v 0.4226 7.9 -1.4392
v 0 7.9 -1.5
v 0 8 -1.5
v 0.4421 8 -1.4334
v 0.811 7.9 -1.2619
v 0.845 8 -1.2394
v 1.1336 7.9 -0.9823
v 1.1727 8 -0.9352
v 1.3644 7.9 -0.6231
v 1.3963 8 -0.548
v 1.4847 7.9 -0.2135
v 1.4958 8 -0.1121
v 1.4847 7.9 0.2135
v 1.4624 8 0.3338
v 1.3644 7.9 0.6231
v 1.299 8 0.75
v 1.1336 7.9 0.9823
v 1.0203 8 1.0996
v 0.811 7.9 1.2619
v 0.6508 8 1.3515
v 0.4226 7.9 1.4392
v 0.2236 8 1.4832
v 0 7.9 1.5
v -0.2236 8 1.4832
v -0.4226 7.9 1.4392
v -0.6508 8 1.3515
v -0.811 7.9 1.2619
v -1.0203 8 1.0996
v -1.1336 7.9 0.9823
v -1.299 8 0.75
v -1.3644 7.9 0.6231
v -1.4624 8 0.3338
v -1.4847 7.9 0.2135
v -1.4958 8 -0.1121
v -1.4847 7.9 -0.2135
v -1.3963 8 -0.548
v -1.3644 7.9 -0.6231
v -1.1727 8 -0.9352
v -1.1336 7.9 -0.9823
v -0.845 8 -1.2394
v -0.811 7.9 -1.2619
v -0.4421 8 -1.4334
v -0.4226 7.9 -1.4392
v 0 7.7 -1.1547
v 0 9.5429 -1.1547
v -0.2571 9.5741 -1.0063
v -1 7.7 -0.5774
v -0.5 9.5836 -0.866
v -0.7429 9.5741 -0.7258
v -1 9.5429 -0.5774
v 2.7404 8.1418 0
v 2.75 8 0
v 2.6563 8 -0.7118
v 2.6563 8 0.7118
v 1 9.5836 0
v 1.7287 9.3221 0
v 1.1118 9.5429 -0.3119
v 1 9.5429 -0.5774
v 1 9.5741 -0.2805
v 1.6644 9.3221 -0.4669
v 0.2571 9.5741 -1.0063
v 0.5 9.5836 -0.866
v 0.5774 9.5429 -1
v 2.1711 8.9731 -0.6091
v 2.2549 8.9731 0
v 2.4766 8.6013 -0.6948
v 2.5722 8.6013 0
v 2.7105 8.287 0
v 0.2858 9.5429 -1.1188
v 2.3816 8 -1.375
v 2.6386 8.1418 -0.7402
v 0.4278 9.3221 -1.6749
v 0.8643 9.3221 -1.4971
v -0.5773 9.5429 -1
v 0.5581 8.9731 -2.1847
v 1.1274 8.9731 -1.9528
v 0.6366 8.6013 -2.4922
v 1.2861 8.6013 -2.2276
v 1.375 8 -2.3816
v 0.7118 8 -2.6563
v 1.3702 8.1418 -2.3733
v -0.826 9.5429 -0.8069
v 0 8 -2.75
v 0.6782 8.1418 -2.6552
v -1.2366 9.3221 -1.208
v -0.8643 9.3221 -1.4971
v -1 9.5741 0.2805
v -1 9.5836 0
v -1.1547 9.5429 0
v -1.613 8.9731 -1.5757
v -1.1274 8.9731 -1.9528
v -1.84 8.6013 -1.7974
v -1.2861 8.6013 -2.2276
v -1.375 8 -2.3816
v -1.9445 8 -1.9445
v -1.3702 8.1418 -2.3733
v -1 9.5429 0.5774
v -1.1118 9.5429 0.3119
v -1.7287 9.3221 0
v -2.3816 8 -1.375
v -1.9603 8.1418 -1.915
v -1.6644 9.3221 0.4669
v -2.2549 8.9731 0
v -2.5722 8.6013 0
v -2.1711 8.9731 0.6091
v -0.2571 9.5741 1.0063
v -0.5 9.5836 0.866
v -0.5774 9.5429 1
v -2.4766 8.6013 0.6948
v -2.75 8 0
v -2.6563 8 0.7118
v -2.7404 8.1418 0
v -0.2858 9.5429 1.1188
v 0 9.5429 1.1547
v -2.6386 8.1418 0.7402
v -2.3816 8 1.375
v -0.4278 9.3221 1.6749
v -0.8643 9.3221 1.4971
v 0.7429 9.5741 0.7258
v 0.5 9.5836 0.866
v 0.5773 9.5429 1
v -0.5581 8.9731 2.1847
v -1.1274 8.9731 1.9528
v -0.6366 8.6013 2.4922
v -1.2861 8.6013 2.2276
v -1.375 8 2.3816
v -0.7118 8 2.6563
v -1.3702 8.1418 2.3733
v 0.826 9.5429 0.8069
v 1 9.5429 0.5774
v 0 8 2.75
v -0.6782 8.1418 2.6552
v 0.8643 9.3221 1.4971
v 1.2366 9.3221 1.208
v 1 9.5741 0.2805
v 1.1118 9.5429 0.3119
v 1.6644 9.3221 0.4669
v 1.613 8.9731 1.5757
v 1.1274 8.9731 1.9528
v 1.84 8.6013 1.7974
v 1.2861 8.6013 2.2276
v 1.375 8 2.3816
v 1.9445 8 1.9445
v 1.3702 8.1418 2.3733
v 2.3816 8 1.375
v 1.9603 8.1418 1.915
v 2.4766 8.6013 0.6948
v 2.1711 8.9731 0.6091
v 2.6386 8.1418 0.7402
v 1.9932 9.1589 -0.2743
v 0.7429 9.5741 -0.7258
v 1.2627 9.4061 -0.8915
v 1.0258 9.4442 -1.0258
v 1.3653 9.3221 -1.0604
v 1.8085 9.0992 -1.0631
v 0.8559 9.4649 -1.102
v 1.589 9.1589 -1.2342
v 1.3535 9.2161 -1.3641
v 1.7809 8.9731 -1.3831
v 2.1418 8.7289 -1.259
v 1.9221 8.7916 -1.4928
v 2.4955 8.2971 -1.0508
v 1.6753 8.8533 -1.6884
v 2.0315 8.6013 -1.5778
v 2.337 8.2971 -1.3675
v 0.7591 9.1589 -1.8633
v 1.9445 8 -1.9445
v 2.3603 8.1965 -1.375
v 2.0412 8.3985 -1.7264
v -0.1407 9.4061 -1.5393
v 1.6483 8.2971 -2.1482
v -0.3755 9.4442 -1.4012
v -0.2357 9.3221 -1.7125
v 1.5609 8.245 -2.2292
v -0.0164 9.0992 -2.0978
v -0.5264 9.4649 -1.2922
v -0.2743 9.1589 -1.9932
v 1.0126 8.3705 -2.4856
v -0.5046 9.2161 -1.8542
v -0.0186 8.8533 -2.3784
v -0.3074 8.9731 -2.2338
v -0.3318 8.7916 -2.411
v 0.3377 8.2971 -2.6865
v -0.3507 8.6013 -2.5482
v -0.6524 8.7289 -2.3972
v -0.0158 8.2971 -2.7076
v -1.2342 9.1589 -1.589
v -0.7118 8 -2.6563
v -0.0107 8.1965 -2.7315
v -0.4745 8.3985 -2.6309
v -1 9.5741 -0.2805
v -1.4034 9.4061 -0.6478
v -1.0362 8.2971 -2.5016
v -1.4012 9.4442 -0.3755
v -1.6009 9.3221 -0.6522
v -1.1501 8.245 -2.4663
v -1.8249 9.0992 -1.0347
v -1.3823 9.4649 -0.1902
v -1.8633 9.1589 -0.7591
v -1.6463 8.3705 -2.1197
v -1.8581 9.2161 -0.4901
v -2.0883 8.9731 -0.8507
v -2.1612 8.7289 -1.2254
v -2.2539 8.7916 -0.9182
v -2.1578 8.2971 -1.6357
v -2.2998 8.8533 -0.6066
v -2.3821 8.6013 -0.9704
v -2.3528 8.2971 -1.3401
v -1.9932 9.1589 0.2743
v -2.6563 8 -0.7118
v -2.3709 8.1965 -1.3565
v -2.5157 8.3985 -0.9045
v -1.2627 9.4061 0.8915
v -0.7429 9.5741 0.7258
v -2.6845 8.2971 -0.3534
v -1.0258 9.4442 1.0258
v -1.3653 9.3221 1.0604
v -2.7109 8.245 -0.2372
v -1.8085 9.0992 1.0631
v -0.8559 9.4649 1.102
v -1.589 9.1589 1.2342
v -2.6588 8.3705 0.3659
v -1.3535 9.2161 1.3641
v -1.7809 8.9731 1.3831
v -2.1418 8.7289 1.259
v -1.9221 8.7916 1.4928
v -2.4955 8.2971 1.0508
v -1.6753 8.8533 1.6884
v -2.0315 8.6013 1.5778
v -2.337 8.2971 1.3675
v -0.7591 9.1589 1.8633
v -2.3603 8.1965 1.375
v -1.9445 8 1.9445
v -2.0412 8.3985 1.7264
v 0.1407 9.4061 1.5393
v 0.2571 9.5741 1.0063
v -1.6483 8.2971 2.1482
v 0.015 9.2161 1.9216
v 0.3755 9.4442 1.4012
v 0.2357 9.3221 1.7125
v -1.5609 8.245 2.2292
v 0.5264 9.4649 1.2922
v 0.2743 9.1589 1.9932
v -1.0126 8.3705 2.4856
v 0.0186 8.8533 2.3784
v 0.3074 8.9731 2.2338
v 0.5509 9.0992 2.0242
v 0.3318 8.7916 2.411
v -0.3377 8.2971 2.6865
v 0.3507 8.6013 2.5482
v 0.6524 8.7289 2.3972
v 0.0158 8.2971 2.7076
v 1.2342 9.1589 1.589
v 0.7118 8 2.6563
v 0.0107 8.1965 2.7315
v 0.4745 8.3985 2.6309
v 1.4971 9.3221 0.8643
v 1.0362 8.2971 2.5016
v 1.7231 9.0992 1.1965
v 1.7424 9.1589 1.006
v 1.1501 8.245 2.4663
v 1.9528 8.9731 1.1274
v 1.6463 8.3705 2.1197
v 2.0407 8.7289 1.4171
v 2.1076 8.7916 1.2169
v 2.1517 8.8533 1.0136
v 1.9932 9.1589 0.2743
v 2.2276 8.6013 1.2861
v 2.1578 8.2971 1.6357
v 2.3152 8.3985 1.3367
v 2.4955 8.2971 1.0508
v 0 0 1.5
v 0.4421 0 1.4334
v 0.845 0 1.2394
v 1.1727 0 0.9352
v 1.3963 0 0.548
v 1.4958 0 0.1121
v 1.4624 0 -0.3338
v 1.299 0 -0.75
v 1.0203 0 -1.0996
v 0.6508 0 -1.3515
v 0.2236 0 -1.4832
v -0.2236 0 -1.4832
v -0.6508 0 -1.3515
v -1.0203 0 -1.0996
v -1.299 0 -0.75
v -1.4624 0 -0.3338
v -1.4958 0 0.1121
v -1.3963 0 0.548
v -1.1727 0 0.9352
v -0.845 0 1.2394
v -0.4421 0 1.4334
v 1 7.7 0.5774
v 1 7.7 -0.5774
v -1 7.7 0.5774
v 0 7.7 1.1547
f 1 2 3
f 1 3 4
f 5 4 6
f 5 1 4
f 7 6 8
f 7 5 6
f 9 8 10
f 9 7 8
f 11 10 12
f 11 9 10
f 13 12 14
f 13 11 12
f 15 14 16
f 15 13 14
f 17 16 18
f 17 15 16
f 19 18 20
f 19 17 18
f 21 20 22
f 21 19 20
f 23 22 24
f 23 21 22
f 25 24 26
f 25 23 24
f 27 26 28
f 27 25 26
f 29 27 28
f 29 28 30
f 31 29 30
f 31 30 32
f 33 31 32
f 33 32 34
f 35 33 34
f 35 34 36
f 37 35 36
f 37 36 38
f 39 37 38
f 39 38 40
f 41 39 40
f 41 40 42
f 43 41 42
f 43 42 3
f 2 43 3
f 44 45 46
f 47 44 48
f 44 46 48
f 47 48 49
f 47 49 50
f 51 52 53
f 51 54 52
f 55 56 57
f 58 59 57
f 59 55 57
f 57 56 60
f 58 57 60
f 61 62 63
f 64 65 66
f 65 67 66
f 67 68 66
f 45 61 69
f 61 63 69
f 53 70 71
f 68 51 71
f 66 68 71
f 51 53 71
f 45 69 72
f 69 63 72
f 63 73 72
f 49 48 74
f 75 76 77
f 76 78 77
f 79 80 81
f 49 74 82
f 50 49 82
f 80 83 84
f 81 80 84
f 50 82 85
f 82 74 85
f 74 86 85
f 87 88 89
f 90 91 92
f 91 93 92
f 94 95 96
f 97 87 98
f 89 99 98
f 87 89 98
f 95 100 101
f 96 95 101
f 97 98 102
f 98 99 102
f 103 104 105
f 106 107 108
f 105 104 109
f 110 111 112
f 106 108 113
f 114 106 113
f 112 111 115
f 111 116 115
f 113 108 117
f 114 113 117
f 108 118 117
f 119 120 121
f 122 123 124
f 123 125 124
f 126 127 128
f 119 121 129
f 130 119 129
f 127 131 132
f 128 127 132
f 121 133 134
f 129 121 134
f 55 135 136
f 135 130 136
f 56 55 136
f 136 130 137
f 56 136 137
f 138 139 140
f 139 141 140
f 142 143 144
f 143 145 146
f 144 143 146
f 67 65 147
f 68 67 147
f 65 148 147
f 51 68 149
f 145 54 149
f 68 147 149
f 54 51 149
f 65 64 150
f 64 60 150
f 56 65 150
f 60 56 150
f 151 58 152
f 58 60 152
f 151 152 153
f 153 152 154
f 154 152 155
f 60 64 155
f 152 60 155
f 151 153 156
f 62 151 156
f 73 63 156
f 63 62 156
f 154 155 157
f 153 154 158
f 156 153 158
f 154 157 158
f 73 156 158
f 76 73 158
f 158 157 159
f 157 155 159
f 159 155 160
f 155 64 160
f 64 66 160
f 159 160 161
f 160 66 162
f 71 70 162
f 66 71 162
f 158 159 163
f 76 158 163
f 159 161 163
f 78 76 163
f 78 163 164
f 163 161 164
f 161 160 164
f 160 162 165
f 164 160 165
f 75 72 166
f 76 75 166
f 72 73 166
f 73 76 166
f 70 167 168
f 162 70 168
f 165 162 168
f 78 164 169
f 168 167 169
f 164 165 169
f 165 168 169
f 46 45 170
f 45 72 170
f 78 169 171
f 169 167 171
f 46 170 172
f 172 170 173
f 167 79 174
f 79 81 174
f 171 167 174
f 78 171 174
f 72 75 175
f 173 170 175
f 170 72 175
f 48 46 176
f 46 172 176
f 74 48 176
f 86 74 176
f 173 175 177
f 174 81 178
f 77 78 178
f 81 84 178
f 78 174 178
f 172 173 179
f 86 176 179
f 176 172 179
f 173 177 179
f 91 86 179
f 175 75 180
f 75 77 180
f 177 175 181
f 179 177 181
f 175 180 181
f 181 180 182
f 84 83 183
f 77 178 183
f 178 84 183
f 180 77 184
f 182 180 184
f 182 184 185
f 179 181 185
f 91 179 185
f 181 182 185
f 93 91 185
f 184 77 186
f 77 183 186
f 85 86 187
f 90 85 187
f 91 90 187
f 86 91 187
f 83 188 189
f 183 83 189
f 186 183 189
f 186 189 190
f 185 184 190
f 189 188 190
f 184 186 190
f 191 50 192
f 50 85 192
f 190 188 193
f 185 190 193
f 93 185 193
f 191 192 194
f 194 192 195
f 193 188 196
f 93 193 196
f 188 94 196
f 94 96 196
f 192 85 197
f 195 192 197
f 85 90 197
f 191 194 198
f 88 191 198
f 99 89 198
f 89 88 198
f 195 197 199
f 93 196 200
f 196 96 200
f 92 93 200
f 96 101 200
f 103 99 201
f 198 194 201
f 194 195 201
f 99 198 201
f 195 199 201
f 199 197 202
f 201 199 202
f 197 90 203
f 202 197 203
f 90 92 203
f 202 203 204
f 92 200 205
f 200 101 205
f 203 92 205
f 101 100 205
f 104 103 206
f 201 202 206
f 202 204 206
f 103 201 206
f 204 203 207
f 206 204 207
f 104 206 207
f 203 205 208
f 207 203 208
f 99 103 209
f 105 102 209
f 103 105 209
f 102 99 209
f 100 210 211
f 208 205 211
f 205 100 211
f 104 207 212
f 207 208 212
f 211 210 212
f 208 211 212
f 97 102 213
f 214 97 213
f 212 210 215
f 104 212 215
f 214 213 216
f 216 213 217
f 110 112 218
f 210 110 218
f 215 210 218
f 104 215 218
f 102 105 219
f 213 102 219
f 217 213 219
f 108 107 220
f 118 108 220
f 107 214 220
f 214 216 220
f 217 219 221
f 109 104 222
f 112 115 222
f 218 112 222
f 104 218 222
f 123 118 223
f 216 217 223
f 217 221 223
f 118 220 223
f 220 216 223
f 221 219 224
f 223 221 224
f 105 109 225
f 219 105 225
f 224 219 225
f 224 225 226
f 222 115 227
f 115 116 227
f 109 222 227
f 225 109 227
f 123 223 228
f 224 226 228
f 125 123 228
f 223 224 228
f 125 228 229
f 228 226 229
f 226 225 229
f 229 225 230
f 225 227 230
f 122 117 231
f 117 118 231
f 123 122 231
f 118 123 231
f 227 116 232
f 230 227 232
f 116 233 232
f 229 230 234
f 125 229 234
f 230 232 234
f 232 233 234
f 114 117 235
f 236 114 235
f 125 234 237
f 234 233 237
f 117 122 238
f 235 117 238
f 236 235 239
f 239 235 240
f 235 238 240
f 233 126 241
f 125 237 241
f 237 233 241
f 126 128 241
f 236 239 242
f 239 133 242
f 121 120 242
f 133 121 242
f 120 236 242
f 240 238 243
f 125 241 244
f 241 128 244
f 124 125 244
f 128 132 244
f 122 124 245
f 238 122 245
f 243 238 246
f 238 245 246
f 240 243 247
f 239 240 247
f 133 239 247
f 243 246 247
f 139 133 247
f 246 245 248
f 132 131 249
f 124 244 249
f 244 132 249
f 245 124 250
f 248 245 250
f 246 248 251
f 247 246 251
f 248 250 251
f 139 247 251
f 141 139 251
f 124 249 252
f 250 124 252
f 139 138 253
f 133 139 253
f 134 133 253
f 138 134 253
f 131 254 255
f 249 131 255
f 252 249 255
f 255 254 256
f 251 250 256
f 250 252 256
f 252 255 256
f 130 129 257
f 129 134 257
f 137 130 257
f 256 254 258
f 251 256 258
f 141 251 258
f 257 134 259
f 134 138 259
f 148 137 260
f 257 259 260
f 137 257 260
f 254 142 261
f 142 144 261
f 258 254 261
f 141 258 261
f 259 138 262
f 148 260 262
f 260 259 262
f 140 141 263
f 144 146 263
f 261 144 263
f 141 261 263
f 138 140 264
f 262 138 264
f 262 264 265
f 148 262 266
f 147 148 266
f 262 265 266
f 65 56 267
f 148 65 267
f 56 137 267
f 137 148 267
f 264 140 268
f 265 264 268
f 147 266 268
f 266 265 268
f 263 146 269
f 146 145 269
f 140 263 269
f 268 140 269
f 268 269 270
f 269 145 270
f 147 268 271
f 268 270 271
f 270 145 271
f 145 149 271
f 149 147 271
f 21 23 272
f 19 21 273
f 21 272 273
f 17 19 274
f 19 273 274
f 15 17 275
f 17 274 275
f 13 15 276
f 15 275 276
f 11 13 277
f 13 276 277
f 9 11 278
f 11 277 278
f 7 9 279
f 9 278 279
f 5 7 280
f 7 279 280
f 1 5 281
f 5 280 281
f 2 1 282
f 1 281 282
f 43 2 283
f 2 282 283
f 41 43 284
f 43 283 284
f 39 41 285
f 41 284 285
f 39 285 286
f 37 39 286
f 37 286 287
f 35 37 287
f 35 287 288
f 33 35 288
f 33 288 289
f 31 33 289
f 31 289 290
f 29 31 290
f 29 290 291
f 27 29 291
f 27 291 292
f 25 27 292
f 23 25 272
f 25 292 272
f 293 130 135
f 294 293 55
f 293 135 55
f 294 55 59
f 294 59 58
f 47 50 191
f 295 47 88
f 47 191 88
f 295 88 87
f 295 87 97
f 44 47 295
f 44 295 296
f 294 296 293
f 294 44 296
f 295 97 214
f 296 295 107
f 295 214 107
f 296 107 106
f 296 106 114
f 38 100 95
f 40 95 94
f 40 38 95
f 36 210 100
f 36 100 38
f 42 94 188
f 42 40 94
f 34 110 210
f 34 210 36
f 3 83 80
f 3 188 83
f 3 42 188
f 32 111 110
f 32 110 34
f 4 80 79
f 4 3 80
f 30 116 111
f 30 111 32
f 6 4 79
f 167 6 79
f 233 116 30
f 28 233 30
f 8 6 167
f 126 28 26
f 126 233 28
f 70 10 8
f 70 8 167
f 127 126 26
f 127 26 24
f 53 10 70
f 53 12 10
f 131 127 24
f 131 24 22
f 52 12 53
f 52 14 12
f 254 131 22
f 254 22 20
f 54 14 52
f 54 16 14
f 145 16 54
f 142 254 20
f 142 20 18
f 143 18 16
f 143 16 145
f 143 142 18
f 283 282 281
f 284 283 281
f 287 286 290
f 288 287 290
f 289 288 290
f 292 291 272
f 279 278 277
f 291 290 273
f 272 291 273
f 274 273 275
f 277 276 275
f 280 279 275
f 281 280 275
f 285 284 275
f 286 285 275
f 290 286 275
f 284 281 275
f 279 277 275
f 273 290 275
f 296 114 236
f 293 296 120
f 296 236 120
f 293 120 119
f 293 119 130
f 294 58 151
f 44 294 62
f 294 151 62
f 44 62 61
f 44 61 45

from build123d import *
from build123d.topology import SkipClean

# Parameters (mm, degrees)
SKETCH1_R           = 1.5
BOSS_EXTRUDE1_DEPTH = 8
SKETCH2_R           = 2.75
BOSS_EXTRUDE2_DEPTH = 0.1
SKETCH3_R           = 2.75
SKETCH3_R_2         = 1.5
CUT_EXTRUDE1_DEPTH  = 0.1
CUT_EXTRUDE2_DEPTH  = 2


# Read off the part's stored shape, not the designer's step: Dome1
with BuildPart() as part:
    # Sketch1 → Boss-Extrude1 (new body)
    with BuildSketch(Plane(origin=(0, 0, 0), x_dir=(1, 0, 0), z_dir=(0, 1, 0))):
        with Locations(Location((0, 0, 0), (0, 0, 270))):
            Circle(SKETCH1_R)
    extrude(amount=BOSS_EXTRUDE1_DEPTH)

    # Sketch2 → Boss-Extrude2 (add)
    with BuildSketch(Plane(origin=(0, 8, 0), x_dir=(1, 0, 0), z_dir=(0, 1, 0))):
        with Locations(Location((0, 0, 0), (0, 0, 270))):
            Circle(SKETCH2_R)
    extrude(amount=-BOSS_EXTRUDE2_DEPTH)

    # Dome1 outline → Dome1 (revolve)
    with BuildSketch(Plane.XY):
        with BuildLine():
            add(Edge.make_bspline(
                [(0, 9.7), (2.75, 9.7), (2.75, 8)],
                knots=[4.71238898, 4.71238898, 4.71238898, 6.283185307, 6.283185307, 6.283185307], degree=2, weights=[1, 0.707106781, 1]))
            Line((0, 9.7), (0, 8))
            Line((0, 8), (2.75, 8))
        make_face()
    revolve(axis=Axis((0, 0, 0), (0, 1, 0)))

    # Sketch3 → Cut-Extrude1 (cut)
    with SkipClean():  # the faces are left unmerged after this step: merging them gives an invalid solid
        with BuildSketch(Plane.XZ.offset(-7.9)):
            Circle(SKETCH3_R)
            with Locations(Location((0, 0, 0), (0, 0, 270))):
                Circle(SKETCH3_R_2, mode=Mode.SUBTRACT)
        extrude(amount=-CUT_EXTRUDE1_DEPTH, mode=Mode.SUBTRACT)

    # Sketch4 → Cut-Extrude2 (cut)
    with SkipClean():  # the faces are left unmerged after this step: merging them gives an invalid solid
        with BuildSketch(Plane(origin=(0, 9.7, 0), x_dir=(1, 0, 0), z_dir=(0, 1, 0))):
            Polygon((0, 1.154700538), (-1, 0.577350269), (-1, -0.577350269), (0, -1.154700538), (1, -0.577350269), (1, 0.577350269), align=None)
        extrude(amount=-CUT_EXTRUDE2_DEPTH, mode=Mode.SUBTRACT)


solid = part.part
